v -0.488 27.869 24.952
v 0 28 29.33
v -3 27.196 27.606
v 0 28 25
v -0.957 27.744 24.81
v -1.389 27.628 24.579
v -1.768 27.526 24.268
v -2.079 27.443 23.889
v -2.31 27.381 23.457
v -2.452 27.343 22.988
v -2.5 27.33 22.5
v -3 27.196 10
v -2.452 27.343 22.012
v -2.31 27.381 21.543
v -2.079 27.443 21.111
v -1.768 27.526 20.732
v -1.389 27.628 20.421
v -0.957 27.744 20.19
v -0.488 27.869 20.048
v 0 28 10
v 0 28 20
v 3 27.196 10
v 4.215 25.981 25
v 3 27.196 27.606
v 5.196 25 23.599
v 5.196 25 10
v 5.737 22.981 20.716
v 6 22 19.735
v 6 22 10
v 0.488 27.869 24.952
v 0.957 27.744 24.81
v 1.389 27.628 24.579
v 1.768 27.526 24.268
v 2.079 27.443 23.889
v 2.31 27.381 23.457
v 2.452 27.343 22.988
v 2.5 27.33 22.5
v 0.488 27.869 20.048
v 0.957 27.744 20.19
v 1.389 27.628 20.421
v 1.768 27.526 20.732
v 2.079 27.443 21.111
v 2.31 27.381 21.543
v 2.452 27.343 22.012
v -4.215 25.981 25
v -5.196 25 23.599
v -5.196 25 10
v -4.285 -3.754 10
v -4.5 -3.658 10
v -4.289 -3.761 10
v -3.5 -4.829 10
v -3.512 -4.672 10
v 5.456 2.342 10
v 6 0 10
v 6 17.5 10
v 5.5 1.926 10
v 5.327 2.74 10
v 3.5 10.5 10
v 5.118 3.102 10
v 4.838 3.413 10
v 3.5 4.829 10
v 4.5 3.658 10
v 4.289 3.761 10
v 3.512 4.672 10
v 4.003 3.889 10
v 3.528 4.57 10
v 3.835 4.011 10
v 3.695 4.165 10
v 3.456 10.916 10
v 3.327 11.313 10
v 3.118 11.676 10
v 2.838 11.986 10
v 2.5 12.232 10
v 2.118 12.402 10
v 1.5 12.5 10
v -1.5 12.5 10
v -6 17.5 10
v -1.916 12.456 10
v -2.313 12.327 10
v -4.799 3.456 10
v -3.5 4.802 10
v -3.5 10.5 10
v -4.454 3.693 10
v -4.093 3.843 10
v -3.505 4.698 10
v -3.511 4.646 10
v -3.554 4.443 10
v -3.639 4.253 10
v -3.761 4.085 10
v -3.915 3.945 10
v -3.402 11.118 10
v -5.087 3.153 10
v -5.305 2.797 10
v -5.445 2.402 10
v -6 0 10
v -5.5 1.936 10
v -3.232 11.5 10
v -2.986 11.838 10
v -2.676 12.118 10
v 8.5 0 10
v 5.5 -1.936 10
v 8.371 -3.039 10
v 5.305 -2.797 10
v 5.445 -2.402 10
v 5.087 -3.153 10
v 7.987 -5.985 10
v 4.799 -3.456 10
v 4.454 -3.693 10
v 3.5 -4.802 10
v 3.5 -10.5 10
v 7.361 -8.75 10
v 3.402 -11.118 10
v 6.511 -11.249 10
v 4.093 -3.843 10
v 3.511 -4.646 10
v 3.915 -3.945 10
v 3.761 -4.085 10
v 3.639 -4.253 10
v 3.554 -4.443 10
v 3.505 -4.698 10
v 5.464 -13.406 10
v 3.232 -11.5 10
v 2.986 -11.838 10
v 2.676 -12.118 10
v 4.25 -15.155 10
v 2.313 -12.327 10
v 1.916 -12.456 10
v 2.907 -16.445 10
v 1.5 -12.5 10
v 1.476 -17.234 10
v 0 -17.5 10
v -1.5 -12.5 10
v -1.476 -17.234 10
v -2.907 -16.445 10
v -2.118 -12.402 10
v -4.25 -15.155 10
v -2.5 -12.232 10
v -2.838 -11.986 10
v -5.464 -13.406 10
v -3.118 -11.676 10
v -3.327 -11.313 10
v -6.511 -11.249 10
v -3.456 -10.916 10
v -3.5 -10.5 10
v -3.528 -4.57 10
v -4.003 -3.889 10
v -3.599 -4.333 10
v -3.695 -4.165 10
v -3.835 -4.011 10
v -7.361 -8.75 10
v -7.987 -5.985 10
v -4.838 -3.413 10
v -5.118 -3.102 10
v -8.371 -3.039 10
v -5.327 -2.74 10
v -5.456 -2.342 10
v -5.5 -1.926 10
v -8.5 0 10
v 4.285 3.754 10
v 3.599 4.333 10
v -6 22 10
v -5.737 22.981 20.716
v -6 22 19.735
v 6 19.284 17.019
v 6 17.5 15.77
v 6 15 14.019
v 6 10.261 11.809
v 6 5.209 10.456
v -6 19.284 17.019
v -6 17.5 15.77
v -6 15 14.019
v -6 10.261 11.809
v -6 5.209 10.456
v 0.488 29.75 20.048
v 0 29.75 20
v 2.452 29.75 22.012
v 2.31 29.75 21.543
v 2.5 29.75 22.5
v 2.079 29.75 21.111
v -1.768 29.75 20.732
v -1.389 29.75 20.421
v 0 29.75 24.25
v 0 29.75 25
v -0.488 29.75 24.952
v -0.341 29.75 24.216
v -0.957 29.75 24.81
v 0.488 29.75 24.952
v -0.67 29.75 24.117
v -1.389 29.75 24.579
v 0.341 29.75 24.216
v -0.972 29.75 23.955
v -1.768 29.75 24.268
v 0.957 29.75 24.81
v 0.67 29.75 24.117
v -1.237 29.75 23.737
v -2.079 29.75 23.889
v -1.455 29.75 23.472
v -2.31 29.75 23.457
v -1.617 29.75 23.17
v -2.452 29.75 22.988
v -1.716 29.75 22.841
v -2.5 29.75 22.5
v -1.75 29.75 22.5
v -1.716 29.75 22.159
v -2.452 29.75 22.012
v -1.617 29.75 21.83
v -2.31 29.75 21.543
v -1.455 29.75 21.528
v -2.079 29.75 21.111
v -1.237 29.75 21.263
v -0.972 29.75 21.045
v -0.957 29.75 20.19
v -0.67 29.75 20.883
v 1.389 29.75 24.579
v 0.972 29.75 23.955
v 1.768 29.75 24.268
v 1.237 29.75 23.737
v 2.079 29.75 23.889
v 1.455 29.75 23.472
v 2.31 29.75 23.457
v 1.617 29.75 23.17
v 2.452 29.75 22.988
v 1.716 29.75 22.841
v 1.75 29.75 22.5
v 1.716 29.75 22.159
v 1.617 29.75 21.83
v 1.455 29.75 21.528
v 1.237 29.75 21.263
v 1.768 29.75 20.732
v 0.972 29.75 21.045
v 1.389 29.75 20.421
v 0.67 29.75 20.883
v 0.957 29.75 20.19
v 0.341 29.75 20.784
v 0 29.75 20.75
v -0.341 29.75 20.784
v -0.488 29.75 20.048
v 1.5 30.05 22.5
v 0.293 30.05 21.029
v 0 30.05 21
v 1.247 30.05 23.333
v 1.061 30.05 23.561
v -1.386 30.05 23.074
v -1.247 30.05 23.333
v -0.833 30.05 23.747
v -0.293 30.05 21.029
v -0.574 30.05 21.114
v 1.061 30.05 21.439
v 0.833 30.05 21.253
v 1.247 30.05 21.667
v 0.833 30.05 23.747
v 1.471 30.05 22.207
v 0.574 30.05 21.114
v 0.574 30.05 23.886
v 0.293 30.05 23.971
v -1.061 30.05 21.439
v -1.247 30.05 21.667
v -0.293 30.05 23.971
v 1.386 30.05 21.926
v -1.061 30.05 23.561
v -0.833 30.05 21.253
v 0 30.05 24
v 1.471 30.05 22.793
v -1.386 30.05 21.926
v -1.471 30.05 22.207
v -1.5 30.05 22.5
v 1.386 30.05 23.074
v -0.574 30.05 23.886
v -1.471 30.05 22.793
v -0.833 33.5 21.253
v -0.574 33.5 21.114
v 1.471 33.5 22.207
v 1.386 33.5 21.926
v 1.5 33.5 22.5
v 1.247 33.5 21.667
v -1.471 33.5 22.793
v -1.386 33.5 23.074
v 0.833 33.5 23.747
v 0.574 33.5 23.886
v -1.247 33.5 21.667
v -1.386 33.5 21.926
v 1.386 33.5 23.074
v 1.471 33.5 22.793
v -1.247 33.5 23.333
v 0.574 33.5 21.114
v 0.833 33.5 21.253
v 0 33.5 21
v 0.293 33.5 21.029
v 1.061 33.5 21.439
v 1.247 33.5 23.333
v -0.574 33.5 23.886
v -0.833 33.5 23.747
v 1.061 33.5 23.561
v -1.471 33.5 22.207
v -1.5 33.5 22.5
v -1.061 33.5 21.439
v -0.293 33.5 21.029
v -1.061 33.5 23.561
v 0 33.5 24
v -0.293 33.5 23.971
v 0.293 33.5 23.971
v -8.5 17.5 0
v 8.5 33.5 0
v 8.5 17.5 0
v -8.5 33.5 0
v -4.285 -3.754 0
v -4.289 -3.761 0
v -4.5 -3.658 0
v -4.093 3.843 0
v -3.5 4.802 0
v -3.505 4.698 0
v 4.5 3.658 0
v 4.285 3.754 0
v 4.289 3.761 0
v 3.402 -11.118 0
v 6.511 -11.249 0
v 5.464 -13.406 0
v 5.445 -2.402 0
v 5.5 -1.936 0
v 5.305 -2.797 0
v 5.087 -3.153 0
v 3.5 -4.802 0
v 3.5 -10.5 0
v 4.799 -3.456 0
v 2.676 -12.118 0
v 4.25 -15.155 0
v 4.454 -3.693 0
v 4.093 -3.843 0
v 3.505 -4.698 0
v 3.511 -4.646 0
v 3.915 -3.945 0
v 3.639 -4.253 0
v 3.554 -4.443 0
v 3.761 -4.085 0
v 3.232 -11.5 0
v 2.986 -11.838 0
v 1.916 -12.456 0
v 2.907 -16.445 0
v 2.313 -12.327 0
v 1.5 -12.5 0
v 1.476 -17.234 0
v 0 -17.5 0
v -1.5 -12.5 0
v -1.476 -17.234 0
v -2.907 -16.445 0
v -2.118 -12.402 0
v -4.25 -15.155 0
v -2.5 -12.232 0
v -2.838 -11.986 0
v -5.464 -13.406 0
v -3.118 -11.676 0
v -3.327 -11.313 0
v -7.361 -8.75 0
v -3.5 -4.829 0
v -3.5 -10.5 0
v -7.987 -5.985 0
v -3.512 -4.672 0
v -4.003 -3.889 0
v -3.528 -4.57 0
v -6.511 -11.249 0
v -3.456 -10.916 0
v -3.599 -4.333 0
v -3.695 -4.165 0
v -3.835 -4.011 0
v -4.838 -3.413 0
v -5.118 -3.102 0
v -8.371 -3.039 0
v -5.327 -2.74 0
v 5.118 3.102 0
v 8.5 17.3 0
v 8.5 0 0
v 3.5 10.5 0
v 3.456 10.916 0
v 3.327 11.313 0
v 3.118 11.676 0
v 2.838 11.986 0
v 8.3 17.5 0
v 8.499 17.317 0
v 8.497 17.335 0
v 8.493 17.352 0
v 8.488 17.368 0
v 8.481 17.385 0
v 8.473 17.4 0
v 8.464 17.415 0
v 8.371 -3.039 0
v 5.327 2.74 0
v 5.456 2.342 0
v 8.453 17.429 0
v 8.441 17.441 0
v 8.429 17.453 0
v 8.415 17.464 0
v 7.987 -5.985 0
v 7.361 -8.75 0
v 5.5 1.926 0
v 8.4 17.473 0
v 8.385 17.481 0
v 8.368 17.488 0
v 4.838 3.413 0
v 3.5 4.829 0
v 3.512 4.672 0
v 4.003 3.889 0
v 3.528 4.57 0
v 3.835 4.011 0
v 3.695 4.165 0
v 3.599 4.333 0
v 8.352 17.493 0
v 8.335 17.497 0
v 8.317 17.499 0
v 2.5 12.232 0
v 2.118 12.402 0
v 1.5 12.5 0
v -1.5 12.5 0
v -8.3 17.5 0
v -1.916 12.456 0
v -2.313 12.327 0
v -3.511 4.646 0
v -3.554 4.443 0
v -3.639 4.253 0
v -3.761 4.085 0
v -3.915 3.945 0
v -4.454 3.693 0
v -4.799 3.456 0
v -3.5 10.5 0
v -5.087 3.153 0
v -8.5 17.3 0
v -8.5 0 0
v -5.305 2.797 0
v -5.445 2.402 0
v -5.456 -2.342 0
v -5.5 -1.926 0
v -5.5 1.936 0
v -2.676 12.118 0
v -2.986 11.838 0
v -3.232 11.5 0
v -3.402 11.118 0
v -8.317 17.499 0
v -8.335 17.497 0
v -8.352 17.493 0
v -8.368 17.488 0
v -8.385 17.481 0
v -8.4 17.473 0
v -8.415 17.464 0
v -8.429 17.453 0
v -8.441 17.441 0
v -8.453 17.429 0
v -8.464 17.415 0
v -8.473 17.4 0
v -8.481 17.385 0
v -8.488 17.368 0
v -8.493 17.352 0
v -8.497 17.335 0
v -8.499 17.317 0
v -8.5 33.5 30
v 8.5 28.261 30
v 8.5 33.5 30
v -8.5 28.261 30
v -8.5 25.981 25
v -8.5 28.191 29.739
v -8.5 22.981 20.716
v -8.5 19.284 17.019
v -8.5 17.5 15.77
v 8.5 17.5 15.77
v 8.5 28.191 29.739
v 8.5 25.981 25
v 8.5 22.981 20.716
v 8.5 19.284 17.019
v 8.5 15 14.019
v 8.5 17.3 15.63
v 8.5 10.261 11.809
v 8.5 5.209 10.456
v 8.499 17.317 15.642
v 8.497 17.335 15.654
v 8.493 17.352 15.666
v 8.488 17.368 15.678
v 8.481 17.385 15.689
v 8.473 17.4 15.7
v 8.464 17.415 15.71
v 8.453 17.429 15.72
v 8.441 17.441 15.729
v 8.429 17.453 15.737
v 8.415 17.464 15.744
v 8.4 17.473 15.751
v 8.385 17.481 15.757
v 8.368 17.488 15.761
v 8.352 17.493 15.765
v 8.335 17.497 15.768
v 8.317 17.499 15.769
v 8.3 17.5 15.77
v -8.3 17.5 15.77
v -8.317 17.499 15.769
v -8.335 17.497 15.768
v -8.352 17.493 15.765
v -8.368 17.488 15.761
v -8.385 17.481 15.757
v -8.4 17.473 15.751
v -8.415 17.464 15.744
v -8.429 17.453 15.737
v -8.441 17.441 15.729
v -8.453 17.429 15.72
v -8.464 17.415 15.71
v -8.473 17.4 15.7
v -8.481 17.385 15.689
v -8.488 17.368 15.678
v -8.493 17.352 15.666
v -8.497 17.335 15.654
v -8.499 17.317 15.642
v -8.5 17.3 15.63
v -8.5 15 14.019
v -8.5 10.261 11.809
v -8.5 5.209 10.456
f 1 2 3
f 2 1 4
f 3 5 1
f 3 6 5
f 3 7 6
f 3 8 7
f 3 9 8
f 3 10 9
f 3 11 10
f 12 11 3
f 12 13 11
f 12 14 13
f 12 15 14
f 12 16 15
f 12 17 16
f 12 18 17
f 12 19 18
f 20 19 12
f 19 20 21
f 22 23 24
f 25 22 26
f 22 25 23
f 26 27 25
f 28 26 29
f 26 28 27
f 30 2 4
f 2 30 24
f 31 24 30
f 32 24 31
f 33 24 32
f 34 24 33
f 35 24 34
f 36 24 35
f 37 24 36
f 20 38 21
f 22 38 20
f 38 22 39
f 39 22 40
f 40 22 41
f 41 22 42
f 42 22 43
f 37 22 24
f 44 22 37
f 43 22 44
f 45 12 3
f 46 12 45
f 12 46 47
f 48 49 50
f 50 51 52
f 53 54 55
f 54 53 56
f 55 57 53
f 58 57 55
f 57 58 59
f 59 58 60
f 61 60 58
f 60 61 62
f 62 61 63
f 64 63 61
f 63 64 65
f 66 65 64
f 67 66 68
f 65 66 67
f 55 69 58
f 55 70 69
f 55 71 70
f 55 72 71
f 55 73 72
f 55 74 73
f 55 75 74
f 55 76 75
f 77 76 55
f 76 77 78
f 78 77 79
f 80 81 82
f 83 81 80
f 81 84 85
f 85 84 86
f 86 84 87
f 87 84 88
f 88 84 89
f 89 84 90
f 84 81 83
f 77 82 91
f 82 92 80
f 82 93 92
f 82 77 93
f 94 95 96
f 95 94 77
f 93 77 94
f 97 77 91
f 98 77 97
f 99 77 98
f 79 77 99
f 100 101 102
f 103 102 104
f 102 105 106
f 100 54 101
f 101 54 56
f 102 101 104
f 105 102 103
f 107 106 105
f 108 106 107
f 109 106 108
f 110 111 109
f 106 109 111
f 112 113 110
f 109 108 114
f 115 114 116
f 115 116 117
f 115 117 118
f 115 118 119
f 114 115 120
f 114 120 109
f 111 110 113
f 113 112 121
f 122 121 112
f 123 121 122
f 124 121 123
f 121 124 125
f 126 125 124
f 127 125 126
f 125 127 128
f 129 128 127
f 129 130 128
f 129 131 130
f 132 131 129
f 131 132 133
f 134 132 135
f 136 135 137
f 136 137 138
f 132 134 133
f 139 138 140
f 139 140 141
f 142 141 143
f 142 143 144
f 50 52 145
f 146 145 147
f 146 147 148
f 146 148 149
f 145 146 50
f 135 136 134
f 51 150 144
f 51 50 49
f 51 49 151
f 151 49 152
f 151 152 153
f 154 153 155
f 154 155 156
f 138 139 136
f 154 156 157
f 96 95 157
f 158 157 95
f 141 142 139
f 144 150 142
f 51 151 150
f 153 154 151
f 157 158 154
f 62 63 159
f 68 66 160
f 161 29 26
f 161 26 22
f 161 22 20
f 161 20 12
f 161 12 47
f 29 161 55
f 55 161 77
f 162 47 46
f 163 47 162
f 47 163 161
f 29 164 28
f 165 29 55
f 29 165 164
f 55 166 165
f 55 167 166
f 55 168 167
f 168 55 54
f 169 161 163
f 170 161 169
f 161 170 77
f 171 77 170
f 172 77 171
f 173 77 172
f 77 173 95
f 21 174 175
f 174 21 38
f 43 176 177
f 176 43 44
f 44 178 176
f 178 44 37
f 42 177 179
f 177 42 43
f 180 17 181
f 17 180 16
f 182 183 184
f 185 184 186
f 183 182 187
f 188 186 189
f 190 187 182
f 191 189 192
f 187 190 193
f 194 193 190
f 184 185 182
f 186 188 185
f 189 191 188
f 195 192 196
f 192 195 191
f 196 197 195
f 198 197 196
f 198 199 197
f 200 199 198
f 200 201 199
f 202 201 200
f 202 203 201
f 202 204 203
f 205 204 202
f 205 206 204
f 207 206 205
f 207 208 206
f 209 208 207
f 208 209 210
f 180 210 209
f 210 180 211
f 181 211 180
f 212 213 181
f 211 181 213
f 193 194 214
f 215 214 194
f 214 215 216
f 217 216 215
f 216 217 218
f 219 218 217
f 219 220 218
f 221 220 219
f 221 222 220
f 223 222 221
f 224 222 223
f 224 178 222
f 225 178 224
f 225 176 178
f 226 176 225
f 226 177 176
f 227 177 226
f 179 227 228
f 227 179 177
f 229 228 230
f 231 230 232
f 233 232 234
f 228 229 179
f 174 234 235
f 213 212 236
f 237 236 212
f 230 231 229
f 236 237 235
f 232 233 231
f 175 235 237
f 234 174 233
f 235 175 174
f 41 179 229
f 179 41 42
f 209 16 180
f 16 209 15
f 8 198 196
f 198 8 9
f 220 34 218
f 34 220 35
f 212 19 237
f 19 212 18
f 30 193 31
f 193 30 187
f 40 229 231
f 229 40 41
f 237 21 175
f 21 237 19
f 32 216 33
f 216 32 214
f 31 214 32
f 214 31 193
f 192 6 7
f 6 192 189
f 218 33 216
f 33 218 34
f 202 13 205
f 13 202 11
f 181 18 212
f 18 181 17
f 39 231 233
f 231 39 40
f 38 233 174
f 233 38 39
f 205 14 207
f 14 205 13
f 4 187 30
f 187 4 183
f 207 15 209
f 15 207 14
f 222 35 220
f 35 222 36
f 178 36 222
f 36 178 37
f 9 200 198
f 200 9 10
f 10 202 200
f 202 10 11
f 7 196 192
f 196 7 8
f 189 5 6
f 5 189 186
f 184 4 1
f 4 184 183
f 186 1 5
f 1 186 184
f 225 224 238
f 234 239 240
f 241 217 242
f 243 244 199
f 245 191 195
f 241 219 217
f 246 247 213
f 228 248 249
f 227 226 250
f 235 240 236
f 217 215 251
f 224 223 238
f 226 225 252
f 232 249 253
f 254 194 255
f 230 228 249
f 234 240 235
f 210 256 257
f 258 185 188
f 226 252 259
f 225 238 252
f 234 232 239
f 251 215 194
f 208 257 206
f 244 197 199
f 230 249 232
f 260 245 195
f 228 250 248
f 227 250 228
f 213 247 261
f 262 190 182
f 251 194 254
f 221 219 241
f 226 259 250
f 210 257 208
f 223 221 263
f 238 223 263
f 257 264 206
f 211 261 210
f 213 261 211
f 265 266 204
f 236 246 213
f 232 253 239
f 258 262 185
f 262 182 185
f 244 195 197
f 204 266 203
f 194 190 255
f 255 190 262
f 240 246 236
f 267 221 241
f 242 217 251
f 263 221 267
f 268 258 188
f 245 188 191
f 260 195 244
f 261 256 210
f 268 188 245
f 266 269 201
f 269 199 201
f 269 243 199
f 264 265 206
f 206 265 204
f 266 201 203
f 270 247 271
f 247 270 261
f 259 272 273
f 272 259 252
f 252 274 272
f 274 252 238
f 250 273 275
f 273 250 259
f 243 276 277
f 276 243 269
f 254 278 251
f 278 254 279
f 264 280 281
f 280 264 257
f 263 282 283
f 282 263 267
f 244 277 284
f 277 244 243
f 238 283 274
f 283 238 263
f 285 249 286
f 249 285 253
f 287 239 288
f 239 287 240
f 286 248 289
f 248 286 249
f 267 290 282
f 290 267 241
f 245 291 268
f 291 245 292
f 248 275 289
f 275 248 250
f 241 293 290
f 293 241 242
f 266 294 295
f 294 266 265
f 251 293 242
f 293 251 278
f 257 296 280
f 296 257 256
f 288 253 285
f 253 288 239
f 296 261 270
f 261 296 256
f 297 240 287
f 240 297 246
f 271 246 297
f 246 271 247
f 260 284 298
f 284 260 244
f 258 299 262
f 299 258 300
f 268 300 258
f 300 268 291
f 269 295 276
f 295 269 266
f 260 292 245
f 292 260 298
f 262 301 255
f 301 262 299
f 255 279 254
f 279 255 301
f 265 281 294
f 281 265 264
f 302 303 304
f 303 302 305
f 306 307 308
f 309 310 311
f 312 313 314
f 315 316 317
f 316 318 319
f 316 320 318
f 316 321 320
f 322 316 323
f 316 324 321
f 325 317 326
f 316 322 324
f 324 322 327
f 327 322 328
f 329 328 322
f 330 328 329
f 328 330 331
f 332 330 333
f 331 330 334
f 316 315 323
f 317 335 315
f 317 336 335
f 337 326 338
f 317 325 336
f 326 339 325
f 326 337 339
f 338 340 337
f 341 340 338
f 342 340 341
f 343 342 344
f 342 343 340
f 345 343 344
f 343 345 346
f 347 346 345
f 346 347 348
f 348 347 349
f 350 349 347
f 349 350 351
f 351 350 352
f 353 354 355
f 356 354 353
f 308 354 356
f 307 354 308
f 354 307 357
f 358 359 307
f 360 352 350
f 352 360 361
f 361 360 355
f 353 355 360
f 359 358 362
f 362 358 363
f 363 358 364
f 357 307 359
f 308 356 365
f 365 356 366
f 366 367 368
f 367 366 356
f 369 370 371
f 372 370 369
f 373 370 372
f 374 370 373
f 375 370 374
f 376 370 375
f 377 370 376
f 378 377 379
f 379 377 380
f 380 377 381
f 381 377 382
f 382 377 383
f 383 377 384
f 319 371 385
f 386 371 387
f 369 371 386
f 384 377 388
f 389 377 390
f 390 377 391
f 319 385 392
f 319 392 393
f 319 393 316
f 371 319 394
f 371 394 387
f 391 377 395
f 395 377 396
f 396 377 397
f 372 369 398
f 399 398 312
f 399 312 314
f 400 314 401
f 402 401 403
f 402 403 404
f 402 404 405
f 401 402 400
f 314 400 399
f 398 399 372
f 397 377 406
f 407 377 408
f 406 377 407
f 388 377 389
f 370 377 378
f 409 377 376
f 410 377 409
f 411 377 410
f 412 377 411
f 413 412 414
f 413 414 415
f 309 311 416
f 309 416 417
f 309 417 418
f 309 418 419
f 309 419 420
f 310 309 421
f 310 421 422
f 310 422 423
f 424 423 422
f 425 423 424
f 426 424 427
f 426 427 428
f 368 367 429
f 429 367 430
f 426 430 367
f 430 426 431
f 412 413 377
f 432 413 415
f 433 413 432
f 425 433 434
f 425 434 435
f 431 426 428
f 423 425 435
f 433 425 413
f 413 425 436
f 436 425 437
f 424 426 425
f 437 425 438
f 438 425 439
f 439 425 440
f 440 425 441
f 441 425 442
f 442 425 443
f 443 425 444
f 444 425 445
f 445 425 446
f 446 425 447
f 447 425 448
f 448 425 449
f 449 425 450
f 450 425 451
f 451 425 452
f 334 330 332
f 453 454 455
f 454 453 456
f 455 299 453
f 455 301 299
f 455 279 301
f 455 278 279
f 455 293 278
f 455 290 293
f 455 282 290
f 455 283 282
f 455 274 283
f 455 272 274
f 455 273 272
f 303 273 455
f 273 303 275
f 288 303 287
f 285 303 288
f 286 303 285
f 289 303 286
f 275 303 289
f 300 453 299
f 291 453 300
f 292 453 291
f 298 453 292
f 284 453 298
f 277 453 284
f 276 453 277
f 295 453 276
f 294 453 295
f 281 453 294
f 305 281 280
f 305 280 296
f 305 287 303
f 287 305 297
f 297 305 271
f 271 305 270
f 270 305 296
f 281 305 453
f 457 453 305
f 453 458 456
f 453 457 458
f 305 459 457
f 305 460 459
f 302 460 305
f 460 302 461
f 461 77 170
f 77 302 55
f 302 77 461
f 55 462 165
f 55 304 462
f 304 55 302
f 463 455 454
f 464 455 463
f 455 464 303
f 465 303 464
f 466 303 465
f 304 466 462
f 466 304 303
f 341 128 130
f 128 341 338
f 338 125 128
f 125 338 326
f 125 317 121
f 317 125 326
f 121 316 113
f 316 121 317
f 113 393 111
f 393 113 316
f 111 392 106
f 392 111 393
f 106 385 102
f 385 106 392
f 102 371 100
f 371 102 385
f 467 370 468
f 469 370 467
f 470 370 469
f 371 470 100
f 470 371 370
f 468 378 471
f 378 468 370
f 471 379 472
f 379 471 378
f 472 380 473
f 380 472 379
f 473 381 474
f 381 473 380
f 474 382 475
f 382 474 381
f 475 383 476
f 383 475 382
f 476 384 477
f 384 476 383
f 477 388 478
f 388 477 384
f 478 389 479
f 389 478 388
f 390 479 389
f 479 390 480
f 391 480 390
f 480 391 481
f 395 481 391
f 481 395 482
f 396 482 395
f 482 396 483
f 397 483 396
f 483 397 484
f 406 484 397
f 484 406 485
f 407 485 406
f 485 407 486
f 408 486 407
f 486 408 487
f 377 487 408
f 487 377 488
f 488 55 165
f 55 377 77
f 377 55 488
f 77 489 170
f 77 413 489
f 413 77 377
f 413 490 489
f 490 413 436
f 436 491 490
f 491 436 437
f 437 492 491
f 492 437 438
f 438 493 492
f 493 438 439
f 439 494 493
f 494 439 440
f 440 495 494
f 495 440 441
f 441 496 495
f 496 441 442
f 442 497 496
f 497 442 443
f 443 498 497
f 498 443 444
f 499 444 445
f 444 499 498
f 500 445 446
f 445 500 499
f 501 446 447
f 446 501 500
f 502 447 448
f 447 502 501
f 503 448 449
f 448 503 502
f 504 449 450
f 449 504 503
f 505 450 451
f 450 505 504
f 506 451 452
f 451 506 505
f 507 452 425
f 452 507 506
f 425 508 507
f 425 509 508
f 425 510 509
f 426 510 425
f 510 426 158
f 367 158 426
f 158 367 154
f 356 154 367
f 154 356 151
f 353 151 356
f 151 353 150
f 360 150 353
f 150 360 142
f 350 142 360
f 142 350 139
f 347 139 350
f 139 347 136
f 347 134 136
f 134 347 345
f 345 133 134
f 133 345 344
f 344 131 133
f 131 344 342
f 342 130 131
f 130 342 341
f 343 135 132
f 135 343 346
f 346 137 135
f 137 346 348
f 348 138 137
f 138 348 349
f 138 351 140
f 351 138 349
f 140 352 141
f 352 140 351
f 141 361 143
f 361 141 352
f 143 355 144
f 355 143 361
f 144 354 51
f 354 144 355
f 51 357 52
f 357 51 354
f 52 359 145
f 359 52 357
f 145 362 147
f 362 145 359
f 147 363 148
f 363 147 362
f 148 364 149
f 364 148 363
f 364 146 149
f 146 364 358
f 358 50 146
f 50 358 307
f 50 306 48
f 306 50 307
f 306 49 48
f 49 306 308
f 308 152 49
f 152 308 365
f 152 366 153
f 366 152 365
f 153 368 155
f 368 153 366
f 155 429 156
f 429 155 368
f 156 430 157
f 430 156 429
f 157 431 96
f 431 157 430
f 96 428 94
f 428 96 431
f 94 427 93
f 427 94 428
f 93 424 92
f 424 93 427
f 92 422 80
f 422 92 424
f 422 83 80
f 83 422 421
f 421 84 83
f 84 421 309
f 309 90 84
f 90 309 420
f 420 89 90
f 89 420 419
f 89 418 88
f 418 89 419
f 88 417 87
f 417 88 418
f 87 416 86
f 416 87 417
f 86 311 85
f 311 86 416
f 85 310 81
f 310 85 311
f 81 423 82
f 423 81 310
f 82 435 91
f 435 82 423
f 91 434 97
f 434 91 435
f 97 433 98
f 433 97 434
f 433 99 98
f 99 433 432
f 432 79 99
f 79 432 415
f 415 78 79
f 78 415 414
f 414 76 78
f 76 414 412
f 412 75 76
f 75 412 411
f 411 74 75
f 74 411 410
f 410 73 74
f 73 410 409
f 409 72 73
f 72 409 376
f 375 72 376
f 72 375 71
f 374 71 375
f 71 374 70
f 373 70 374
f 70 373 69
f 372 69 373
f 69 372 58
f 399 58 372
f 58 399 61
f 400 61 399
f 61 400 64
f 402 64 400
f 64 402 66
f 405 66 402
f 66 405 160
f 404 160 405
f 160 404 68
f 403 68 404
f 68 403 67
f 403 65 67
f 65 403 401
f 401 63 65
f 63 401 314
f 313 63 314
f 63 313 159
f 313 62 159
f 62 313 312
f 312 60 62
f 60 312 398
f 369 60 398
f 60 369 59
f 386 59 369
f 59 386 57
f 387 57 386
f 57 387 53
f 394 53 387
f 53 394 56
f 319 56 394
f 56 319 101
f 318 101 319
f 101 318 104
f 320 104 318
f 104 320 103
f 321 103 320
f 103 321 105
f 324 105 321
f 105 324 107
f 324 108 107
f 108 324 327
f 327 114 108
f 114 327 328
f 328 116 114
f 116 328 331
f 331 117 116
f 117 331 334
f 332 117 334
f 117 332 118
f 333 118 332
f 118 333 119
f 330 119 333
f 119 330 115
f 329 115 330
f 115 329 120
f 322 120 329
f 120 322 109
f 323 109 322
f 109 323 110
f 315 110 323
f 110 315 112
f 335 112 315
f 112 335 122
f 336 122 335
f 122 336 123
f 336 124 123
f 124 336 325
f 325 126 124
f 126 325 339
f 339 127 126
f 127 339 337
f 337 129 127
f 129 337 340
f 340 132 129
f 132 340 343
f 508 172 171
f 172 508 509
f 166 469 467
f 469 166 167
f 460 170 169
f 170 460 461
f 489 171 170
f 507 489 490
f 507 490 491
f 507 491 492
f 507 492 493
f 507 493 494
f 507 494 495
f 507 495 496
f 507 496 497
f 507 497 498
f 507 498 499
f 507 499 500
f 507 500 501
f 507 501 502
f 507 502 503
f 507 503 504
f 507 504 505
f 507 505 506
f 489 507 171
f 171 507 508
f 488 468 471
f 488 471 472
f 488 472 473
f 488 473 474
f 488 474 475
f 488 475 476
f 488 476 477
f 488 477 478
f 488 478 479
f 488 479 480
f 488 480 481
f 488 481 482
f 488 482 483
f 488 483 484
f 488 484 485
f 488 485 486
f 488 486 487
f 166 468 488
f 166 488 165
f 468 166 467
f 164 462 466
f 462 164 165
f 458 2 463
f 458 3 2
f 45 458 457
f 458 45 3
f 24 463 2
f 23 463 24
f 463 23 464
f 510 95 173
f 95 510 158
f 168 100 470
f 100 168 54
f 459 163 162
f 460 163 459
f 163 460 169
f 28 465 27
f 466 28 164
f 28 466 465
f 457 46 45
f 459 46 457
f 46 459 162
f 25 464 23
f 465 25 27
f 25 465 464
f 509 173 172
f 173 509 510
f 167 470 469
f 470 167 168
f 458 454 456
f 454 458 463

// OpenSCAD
// * Discription what the *.scad is about ect.

// ==================================
// = Used Libraries =
// ==================================

// ==================================
// = Variables =
// ==================================

/* [Tab Name_1] */
// sizing printing or print a small part to test the object.
DesignStatus="sizing"; // ["sizing","fitting","printing"]
// Variables seen by customizer

InnerSpace_X=7;
InnerSpace_Y=25;
Inner_R=3;
ScissorBolt_D=7.5;
ScissorBolt_H=2;
ScissorHandlThickness=12;
Object_Heigth=30;
WallDistance=16;


TestSlab_X=50;
TestSlab_Y=100;
TestSlab_Z=30;

/* [Tab Name_2] */
TestCylinder_H=35;
TestCylinder_D1=25;
TestCylinder_D2=45;

TestSphere_D=42;

module __Customizer_Limit__ () {}  // before these, the variables are usable in the cutomizer
shown_by_customizer = false;


WallThikness=ScissorBolt_H+3;


Invisible=42;
TestslabTransl_X=25;
TestslabRotate_X=30;

// === Facettes Numbers ===

FN_HexNut=6;
FN_Performance=36;
FN_FooBaa=12;
// Divisebile by 4 to align Cylinders whithout small intersections taht cause problems due to smal holes in surfaches and self intersections on round objects

FN_Rough=12;
FN_MediumRough=16;
FN_Medium=36;
FN_Fine=72;
FN_ExtraFine=144;
// ==================================
// = Tuning Variables =
// ==================================
// Variables for finetuning (The Slegehammer if something has to be made fit)

// ==================================
// = Customizer Section =
// ==================================
if (DesignStatus=="printing"){
    Main_Assembly(36,76,"false");
}
if(DesignStatus=="fitting"){
    intersection(){
        translate([0,0,Object_Heigth/3]){
            cube([1000,1000,1],center=true);
        }
        Main_Assembly(16,76,"false");
    }
}
if (DesignStatus=="sizing"){
    Main_Assembly(16,36,"true");
}
// ==================================
// = MAINASSEMBLY =
// ==================================
// LOW_RESOLUTION: low reaulution value to speed up preview
// HIGH_RESOLUTION: high resolution value for rendering the .stl
// CUT_MODULES_RENDERED: decides if the cuttingmodules get renderred to see them. use cuttingmodules twice one time within the final part to cut and one time to just schow it.
// Main_Assembly(12,76,true);

//InnerSpace_X=7;
//InnerSpace_Y=25;
//Inner_R=3;
//ScissorBolt_D=7.5;
//ScissorBolt_H=2;

module Main_Assembly(LOW_RESOLUTION=12,HIGH_RESOLUTION=36,CUT_MODULES_RENDERED){
$fn = $preview ? LOW_RESOLUTION : HIGH_RESOLUTION ; // Facets in preview (F5) set to 12, in Reder (F6) is set to 72
    see_me_in_colourful(){
        translate([0,0,0]){
            difference(){
                Scissor_Wall_Mount();
                hull(){
                    translate([0,(-(InnerSpace_Y+WallThikness*2))/2,Object_Heigth/3+(InnerSpace_Y+WallThikness)]){
                        rotate([0,90,0]){
                            cylinder(h=2*(InnerSpace_X+WallThikness*2),d=2*(InnerSpace_Y+WallThikness),center=true);
                        }
                    }
                    translate([0,0,Object_Heigth/3+(InnerSpace_Y+WallThikness)]){
                        rotate([0,90,0]){
                            cylinder(h=2*(InnerSpace_X+WallThikness*2),d=2*(InnerSpace_Y+WallThikness),center=true);
                        }
                    }
                }
                translate([0,ScissorHandlThickness/2+WallDistance,Object_Heigth/3]){
                    Press_Fit_Cut(-90,Object_Heigth,InnerSpace_Y+WallDistance,ScissorHandlThickness);
                }
                translate([0,(InnerSpace_Y+WallThikness)/2-WallThikness/4+WallDistance,3*Object_Heigth/4]){
                    rotate([-90,0,0]){
                        Screwcutter(100,5,100,3,0.3,3.5);
                    }
                }
            }
        }
        translate([0,0,0]){
        
        }        
        translate([0,0,0]){
            difference(){
              
                
            }
        }
        translate([0,0,0]){
        }
        translate([0,0,0]){
            if(CUT_MODULES_RENDERED=="true"){
                translate([0,(-(InnerSpace_Y+WallThikness*2))/2,Object_Heigth/3+(InnerSpace_Y+WallThikness)]){
                    rotate([0,90,0]){
                        //cylinder(h=2*(InnerSpace_X+WallThikness*2),d=2*(InnerSpace_Y+WallThikness),center=true);
                    }
                }
                translate([0,ScissorHandlThickness/2,Object_Heigth/3]){
                    //Press_Fit_Cut(-90,Object_Heigth,InnerSpace_Y,ScissorHandlThickness);
                }
                translate([0,(InnerSpace_Y+WallThikness)/2-1.5,3*Object_Heigth/4]){
                    rotate([-90,0,0]){
                        //Screwcutter(100,5,100,3,0.3,3.5);
                    }
                }
            }
            else{
                echo("CUT_MODULES_RENDERED= ",CUT_MODULES_RENDERED);
            }
        }
        union(){
            
        }
        translate([ 0,0,0]){
        }
    }
}
// ===============================================================================
// = Module to help coloring different modules to make it easier 
// ===============================================================================
module see_me_in_colourful(){ // iterates the given modules and colors them automaticly by setting values using trigonometric funktions
    translate([0,0,0]){
        for(i=[0:1:$children-1]){
            a=255;
            b=50;       // cuts away the dark colors to prevent bad visual contrast to backgound
            k_farbabstand=((a-b)/$children);
            Farbe=((k_farbabstand*i)/255);
            SINUS_Foo=0.5+(sin(((360/(a-b))*k_farbabstand)*(i+1)))/2;
            COSIN_Foo=0.5+(cos(((360/(a-b))*k_farbabstand)*(i+1)))/2;
            color(c = [ SINUS_Foo,
                        1-(SINUS_Foo/2+COSIN_Foo/2),
                        COSIN_Foo],
                        alpha = 0.5){  
                difference(){
                    render(convexity=10){children(i);} //renders the modules, effect is that inner holes become visible
                    //children(i);
                    translate([70/2,0,0]){
                        //cube([80,90,150],center=true);
                    }
// Creates a Cutting to see a Sidesection cut of the objects
                    color(c = [ SINUS_Foo,
                                1-(SINUS_Foo/2+COSIN_Foo/2),
                                COSIN_Foo],
                                alpha = 0.0){
                        translate([70/2,0,0]){
                            //cube([30,20,150],center=true);
                        }
                        translate([-50,-50,0]){
                            //cube([100,50,200],center=false);
                        }
                    }
                }
            }
        }
    }
}
// ===============================================================================
// =--------------------------------- Enviroment Modules ------------------------=
// ===============================================================================
// Modules that resembles the Enviroment aka the helmet where to atach a camera mount

// ===============================================================================
// =--------------------------------- Modules -----------------------------------=
// ===============================================================================
module Scissor_Wall_Mount(){
    LinExt_Base_Schape_Ring();
}

//TEST_OBJECT();

module TEST_OBJECT(){
    difference(){
        TEST_CUTCUBE(TestSlab_X,TestSlab_Y,TestSlab_Z);
        TEST_CUTCYLINDER();
    }
    TEST_SPHERE();
}

module TEST_CUTCUBE(X=30,Y=60,Z=15){
    cube([X,Y,Z]);
}
module TEST_SPHERE(D=TestSphere_D){
//$fn = $preview ? 12 : 72; // Facets in preview (F5) set to 12, in Reder (F6) is set to 72
    difference(){
        sphere(d=D);
        TEST_CUTCYLINDER();
    }
}
module TEST_CUTCYLINDER(H=TestCylinder_H,D1=TestCylinder_D1,D2=TestCylinder_D2){
    cylinder(h=H,d1=D1,d2=D2,$fn=24);
}

// ===============================================================================
// ---------------------------------- Cutting Modules ----------------------------
// ===============================================================================
//Press_Fit_Cut(33,14,17,0.8);
module Press_Fit_Cut(Angle=22,Thickness=11,Length=22,Width=0.2){
    rotate([0,0,Angle]){
        translate([0,0,Thickness/2]){
            cylinder(h=Thickness,d=Width,center=true,$fn=12);
        }
        translate([0,-Width/2,0]){
            cube([Length,Width,Thickness]);
        }
        translate([Length,0,Thickness/2]){
            cylinder(h=Thickness,d=Width,center=true,$fn=12);
        }
    }
}

//Screwcutter(100,10,100,4,1,5);
module Screwcutter( SCREW_HEAD_h=200,
                    SCREW_HEAD_d=40,
                    SCREW_BOLT_h=200,
                    SCREW_BOLT_d=3,
                    SCREW_CAMPFER_h,
                    SCREW_CAMPFER_d=5){
    translate([0,0,-SCREW_HEAD_h]){
        cylinder(h=SCREW_HEAD_h,d=SCREW_HEAD_d,$fn=32);
    }
    translate([0,0,0]){
        cylinder(h=SCREW_CAMPFER_h,d2=SCREW_BOLT_d,d1=SCREW_CAMPFER_d,$fn=32);    
    }
    translate([0,0,0]){
        cylinder(h=SCREW_BOLT_h,d=SCREW_BOLT_d,$fn=32);
    }
}
//Bolt(25,3,8,3);
module Bolt(BOLTLENGTH,BOLTDIAMETER,HEADDIAMETER,HEADHEIGHT){
    cylinder(h=BOLTLENGTH,d=BOLTDIAMETER,center=false,$fn=FN_Performance);
    translate([0,0,-HEADHEIGHT/2]){
        cylinder(h=HEADHEIGHT,d=HEADDIAMETER,center=true,$fn=6);
        cylinder(h=HEADHEIGHT,d=HEADDIAMETER,center=true,$fn=6);
    }
}
//Projection_Cutter(3){sphere(10);};
module Projection_Cutter(Offset_z){    
    projection(cut = true){
        translate([0,0,Offset_z]){
            children();
        }
    }
}
// ===============================================================================
// ---------------------------------- Intersection Modules -----------------------
// ===============================================================================

module Intersection_Test_Cut(PLAIN,THICKNESS,OFFSET){
// ==== EXAMPLE ====
//    !Intersection_Test_Cut("xy",1,7/2){sphere(7);};
// ==== EXAMPLE ====
    if (PLAIN=="xz"){
        intersection(){
            children();
            translate([0,OFFSET,0]){
                cube([100,THICKNESS,100],center=true);
            }
        }
    }
    else if (PLAIN=="xy") {
        intersection(){
            children();
            translate([0,0,OFFSET]){
                cube([500,500,THICKNESS],center=true);
            }
        }
    }
    else if (PLAIN=="yz") {
        intersection(){
            children();
            translate([OFFSET,0,0]){
                cube([THICKNESS,100,100],center=true);
            }
        }   
    }
}
// ===============================================================================
// ---------------------------------- Linear Extrude Modules ---------------------
// ===============================================================================
//LinExt_Base_Schape_Ring();
module LinExt_Base_Schape_Ring(){
linear_extrude(Object_Heigth){
    Base_Schape_Ring();
    }    
}

//Ring_Shaper(3,15,1.5);
module Ring_Shaper(HEIGHT,OUTER,WALLTHICKNESS){
    linear_extrude(HEIGHT){
        2D_Ring_Shape(OUTER,WALLTHICKNESS);
    }
}
//Linear_Extruding(10,-1){2D_Rounded_Square_Base_Shape(10,20,3);}
module Linear_Extruding(ExtrudeLength,ExrtudingDirektionInverter){
//   0  Normal
//  -1  inverted
//   1  
    Length=ExtrudeLength;
    translate([0,0,Length*ExrtudingDirektionInverter]){
        linear_extrude(height=ExtrudeLength){
            children();
        }
    }
}

// ===============================================================================
// ---------------------------------- Rotate Extrude Modules ---------------------
// ===============================================================================

//DONUT(1,20,1,7);
module DONUT(DIAMETER,DIAMETER_RING,SCAL_X,SCAL_Y){
//DIAMETER The dough part
//DIAMETER_RING The hole part
//SCAL_X, skales the x dimension
//SCAL_Y, skales the y dimension
    rotate_extrude(angle=360,convexity=3,$fn=FN_Fine){
        translate([DIAMETER_RING,0,0]){
            scale([SCAL_X,SCAL_Y,1]){
                circle(d=DIAMETER,$fn=FN_Fine);
            }
        }
    }
}
// ===============================================================================
// =--------------------------------- 2D-Shapes ---------------------------------=
// ===============================================================================
//Base_Schape_Ring();
module Base_Schape_Ring(){
    InnerSpace_X=7;
    InnerSpace_Y=25;
    Inner_R=3;
    ScissorBolt_D=7.5;
    ScissorBolt_H=2;
    WallThikness=ScissorBolt_H+3;
    difference(){
        union(){
            2D_Rounded_Square_Base_Shape(InnerSpace_X+WallThikness*2,InnerSpace_Y+WallThikness*2,0.2);
            translate([0,(InnerSpace_Y+WallThikness*2+WallDistance)/2,0]){
                square([InnerSpace_X+WallThikness*2,WallDistance],center=true);
            }
        }
        Smooth(r=2){
            Fillet(r=1){
                square([InnerSpace_X,InnerSpace_Y],center=true);
                square([InnerSpace_X+2*ScissorBolt_H,ScissorBolt_D],center=true);
            }
        }
        ScaleCircle_y=(InnerSpace_Y+WallThikness*2)/(InnerSpace_X+WallThikness*2);
        difference(){
            square([2*(InnerSpace_X+WallThikness*2),InnerSpace_Y*2],center=true);
            scale([1,ScaleCircle_y]){
                circle(d=InnerSpace_X+WallThikness*2);
            }
            translate([0,InnerSpace_Y,0]){
                square([2*(InnerSpace_X+WallThikness*2),InnerSpace_Y*2],center=true);
            }
        }
    }
}
//2D_Ring_Shape(20,1);
module 2D_Ring_Shape(OUTER_D,WALLTHICKNESS){
    difference(){
        circle(d=OUTER_D,$fn=FN_Fine);
        circle(d=OUTER_D-2*WALLTHICKNESS,$fn=FN_Fine);
    }
}
//2D_Rounded_Square_Base_Shape(10,20,3);
module 2D_Rounded_Square_Base_Shape(DIMENSION_X=10,DIMENSION_Y=20,RADIUS=2,CENTER=true){
    if(CENTER){
        translate([0,0,0]){
            minkowski(){
                square([DIMENSION_X-RADIUS*2,DIMENSION_Y-RADIUS*2],center=CENTER);
                circle(r=RADIUS,$fn=FN_Fine);
            }
        }
    }
    else{
        translate([RADIUS,RADIUS,0]){
            minkowski(){
                square([DIMENSION_X-RADIUS*2,DIMENSION_Y-RADIUS*2],center=CENTER);
                circle(r=RADIUS,$fn=FN_Fine);
            }
        }
    }
}
//HEX_Mesh_Pattern(){ Mesh(2.5,2.5);}
module HEX_Mesh_Pattern(X=10,Y=30,DELTA=5,GRPL_X=45,GRPL_Y=115){
Count_X=X;
Count_Y=Y;
DIMENSION_X=35;
DIMENSION_Y=67;


//DELTA=1;

X_STEPP=5.5+DELTA;
Y_STEPP=7.5+DELTA;

k=DELTA; //Distance between Hexshapes may be HEX_D/4 is good
HEX_D=(DIMENSION_X-((Count_X-1)*k/2))/(Count_X-1);

SCALE_Y=DIMENSION_Y/((HEX_D/2+k/4)*sqrt(3)*(Count_Y-1));
echo("HEX_D*Count_Y",HEX_D*(Count_Y));
echo("GrindingPlate_Y",DIMENSION_Y);
echo("SCALE_Y",SCALE_Y);

//square([15,(HEX_D/2+k/4)*sqrt(3)*(Count_Y-1)]); // Helper Foo
    
// +++++++++++++++++++++++++++++++++++++++++
    scale([1,SCALE_Y,1]){
        union(){
            for(j=[0:1:Count_Y-1]){
                for(i=[0:1:Count_X-1-j%2]){
                    translate([i*(HEX_D+k/2),0,0]){
                        translate([(HEX_D/2+k/4)*(j%2),
                                    j*((HEX_D/2+k/4)*sqrt(3)),
                                    0]                          ){
                        //translate([0,j*Y_STEPP,0]){
                        rotate([0,0,60]){
                            //Mesh(0.5){square([HEX_D,HEX_D*1.2],center=true);}
                            circle(d=HEX_D,$fn=6);
                        }
                            //children();
                        }
                    }
                }
            }
        }
    }
}
//Mesh(4){square([7,10],center=true);}
module Mesh(RADIUS=0.0){
minkowski(){
    children();
    circle(r=RADIUS,$fn=144);
    }
}
// ===============================================================================
// =--------------------------------- Symetrie Helper ---------------------------=
// ===============================================================================
// XY_Symetrie(10,25){cube(10);}
module XY_Symetrie(X=10,Y=25){
   translate([X,Y,0]){
       children();
       }
    mirror([1,0,0]){
        translate([X,Y,0]){
            children();
       }
    }
    mirror([0,1,0]){
        translate([X,Y,0]){
            children();
        }
        mirror([1,0,0]){
            translate([X,Y,0]){
                children();
            }
        }
    }
}
module MirrorMirrorOnTheWall(Offset_X,Offset_Y){
    translate([-Offset_X,Offset_Y,0]){
        children();
        mirror([0,1,0]){
            children();
        }
    }
    translate([Offset_X,-Offset_Y,0]){
        mirror([1,0,0]){
            children();
            mirror([1,0,0]){
                children();
            }
        }
    }
}
// ===============================================================================
// =--------------------------------- Textembossing -----------------------------=
// ===============================================================================

// ===============================================================================
// =--------------------------------- Smoothing ---------------------------------=
// ===============================================================================
2D_Smooth_r=1;
// Radius of a outer Tip Rounding 
2D_Fillet_r=1;
// Radius of a inner corner Ronding
2D_Chamfer_DELTA_INN=1;
2D_Chamfer_DELTA_OUT=2;
// a straigt line on edges and corners
2D_Chamfer_BOOLEAN=false;    

//Smooth(r=3){square([40,10]);square([10,40]);}
module Smooth(r=3){
    //$fn=30;
    offset(r=r,$fn=30){
        offset(r=-r,$fn=30){
        children();
        }
    }
}
//Fillet(r=3){square([40,10],center=true);square([10,40],center=true);}
module Fillet(r=3){
    //$fn=30;
    offset(r=-r,$fn=30){
        offset(r=r,$fn=30){
            children();
        }
    }
}
// Inner and outer Fillet =====================================
// Smooth(r=3){Fillet(r=3){square([40,10]);square([10,40]);}}
// ================================================================
module Chamfer_OUTWARD(DELTA_OUT=3){
    //$fn=30;
    offset(delta=DELTA_OUT,chamfer=true,$fn=30){
        offset(delta=-DELTA_OUT,chamfer=true, $fn=30){
            children();
        }
    }
}
module Chamfer_INWARD(DELTA_INN=3){
    //$fn=30;
    offset(delta=-DELTA_INN,chamfer=true,$fn=30){
        offset(delta=DELTA_INN,chamfer=true, $fn=30){
            children();
        }
    }
}
// ===============================================================================
// =--------------------------------- Ruthex --------------------------------=
// ===============================================================================
// Dimensions for Ruthex Tread inseerts
//RUTHEX_M3();
module RUTHEX_M3(){    
L=5.7+5.7*0.25; // Length + Margin
echo("RUTHEX",L);
D1=4.0;    
    translate([0,0,0]){
        rotate([0,0,0]){
            translate([0,0,0]){
                cylinder(h=L,d1=D1,d2=D1,$fn=FN_Performance);
            }
        }
    }
}
// ===============================================================================
// =--------------------------------- Import STL --------------------------------=
// ===============================================================================
module NAME_OF_IMPORT(){
    rotate([0,0,-90]){
        translate([-515,-100,-45]){
            import("PATH/TO/FILE.stl",convexity=3);
        }
    }
}
// ===============================================================================
// =--------------------------------- Import PNG --------------------------------=
// ===============================================================================
module NAME_OF_IMPORT(){
    rotate([0,0,-90]){
        translate([-515,-100,-45]){
            import("PATH/TO/FILE.PNG",convexity=3);
        }
    }
}
